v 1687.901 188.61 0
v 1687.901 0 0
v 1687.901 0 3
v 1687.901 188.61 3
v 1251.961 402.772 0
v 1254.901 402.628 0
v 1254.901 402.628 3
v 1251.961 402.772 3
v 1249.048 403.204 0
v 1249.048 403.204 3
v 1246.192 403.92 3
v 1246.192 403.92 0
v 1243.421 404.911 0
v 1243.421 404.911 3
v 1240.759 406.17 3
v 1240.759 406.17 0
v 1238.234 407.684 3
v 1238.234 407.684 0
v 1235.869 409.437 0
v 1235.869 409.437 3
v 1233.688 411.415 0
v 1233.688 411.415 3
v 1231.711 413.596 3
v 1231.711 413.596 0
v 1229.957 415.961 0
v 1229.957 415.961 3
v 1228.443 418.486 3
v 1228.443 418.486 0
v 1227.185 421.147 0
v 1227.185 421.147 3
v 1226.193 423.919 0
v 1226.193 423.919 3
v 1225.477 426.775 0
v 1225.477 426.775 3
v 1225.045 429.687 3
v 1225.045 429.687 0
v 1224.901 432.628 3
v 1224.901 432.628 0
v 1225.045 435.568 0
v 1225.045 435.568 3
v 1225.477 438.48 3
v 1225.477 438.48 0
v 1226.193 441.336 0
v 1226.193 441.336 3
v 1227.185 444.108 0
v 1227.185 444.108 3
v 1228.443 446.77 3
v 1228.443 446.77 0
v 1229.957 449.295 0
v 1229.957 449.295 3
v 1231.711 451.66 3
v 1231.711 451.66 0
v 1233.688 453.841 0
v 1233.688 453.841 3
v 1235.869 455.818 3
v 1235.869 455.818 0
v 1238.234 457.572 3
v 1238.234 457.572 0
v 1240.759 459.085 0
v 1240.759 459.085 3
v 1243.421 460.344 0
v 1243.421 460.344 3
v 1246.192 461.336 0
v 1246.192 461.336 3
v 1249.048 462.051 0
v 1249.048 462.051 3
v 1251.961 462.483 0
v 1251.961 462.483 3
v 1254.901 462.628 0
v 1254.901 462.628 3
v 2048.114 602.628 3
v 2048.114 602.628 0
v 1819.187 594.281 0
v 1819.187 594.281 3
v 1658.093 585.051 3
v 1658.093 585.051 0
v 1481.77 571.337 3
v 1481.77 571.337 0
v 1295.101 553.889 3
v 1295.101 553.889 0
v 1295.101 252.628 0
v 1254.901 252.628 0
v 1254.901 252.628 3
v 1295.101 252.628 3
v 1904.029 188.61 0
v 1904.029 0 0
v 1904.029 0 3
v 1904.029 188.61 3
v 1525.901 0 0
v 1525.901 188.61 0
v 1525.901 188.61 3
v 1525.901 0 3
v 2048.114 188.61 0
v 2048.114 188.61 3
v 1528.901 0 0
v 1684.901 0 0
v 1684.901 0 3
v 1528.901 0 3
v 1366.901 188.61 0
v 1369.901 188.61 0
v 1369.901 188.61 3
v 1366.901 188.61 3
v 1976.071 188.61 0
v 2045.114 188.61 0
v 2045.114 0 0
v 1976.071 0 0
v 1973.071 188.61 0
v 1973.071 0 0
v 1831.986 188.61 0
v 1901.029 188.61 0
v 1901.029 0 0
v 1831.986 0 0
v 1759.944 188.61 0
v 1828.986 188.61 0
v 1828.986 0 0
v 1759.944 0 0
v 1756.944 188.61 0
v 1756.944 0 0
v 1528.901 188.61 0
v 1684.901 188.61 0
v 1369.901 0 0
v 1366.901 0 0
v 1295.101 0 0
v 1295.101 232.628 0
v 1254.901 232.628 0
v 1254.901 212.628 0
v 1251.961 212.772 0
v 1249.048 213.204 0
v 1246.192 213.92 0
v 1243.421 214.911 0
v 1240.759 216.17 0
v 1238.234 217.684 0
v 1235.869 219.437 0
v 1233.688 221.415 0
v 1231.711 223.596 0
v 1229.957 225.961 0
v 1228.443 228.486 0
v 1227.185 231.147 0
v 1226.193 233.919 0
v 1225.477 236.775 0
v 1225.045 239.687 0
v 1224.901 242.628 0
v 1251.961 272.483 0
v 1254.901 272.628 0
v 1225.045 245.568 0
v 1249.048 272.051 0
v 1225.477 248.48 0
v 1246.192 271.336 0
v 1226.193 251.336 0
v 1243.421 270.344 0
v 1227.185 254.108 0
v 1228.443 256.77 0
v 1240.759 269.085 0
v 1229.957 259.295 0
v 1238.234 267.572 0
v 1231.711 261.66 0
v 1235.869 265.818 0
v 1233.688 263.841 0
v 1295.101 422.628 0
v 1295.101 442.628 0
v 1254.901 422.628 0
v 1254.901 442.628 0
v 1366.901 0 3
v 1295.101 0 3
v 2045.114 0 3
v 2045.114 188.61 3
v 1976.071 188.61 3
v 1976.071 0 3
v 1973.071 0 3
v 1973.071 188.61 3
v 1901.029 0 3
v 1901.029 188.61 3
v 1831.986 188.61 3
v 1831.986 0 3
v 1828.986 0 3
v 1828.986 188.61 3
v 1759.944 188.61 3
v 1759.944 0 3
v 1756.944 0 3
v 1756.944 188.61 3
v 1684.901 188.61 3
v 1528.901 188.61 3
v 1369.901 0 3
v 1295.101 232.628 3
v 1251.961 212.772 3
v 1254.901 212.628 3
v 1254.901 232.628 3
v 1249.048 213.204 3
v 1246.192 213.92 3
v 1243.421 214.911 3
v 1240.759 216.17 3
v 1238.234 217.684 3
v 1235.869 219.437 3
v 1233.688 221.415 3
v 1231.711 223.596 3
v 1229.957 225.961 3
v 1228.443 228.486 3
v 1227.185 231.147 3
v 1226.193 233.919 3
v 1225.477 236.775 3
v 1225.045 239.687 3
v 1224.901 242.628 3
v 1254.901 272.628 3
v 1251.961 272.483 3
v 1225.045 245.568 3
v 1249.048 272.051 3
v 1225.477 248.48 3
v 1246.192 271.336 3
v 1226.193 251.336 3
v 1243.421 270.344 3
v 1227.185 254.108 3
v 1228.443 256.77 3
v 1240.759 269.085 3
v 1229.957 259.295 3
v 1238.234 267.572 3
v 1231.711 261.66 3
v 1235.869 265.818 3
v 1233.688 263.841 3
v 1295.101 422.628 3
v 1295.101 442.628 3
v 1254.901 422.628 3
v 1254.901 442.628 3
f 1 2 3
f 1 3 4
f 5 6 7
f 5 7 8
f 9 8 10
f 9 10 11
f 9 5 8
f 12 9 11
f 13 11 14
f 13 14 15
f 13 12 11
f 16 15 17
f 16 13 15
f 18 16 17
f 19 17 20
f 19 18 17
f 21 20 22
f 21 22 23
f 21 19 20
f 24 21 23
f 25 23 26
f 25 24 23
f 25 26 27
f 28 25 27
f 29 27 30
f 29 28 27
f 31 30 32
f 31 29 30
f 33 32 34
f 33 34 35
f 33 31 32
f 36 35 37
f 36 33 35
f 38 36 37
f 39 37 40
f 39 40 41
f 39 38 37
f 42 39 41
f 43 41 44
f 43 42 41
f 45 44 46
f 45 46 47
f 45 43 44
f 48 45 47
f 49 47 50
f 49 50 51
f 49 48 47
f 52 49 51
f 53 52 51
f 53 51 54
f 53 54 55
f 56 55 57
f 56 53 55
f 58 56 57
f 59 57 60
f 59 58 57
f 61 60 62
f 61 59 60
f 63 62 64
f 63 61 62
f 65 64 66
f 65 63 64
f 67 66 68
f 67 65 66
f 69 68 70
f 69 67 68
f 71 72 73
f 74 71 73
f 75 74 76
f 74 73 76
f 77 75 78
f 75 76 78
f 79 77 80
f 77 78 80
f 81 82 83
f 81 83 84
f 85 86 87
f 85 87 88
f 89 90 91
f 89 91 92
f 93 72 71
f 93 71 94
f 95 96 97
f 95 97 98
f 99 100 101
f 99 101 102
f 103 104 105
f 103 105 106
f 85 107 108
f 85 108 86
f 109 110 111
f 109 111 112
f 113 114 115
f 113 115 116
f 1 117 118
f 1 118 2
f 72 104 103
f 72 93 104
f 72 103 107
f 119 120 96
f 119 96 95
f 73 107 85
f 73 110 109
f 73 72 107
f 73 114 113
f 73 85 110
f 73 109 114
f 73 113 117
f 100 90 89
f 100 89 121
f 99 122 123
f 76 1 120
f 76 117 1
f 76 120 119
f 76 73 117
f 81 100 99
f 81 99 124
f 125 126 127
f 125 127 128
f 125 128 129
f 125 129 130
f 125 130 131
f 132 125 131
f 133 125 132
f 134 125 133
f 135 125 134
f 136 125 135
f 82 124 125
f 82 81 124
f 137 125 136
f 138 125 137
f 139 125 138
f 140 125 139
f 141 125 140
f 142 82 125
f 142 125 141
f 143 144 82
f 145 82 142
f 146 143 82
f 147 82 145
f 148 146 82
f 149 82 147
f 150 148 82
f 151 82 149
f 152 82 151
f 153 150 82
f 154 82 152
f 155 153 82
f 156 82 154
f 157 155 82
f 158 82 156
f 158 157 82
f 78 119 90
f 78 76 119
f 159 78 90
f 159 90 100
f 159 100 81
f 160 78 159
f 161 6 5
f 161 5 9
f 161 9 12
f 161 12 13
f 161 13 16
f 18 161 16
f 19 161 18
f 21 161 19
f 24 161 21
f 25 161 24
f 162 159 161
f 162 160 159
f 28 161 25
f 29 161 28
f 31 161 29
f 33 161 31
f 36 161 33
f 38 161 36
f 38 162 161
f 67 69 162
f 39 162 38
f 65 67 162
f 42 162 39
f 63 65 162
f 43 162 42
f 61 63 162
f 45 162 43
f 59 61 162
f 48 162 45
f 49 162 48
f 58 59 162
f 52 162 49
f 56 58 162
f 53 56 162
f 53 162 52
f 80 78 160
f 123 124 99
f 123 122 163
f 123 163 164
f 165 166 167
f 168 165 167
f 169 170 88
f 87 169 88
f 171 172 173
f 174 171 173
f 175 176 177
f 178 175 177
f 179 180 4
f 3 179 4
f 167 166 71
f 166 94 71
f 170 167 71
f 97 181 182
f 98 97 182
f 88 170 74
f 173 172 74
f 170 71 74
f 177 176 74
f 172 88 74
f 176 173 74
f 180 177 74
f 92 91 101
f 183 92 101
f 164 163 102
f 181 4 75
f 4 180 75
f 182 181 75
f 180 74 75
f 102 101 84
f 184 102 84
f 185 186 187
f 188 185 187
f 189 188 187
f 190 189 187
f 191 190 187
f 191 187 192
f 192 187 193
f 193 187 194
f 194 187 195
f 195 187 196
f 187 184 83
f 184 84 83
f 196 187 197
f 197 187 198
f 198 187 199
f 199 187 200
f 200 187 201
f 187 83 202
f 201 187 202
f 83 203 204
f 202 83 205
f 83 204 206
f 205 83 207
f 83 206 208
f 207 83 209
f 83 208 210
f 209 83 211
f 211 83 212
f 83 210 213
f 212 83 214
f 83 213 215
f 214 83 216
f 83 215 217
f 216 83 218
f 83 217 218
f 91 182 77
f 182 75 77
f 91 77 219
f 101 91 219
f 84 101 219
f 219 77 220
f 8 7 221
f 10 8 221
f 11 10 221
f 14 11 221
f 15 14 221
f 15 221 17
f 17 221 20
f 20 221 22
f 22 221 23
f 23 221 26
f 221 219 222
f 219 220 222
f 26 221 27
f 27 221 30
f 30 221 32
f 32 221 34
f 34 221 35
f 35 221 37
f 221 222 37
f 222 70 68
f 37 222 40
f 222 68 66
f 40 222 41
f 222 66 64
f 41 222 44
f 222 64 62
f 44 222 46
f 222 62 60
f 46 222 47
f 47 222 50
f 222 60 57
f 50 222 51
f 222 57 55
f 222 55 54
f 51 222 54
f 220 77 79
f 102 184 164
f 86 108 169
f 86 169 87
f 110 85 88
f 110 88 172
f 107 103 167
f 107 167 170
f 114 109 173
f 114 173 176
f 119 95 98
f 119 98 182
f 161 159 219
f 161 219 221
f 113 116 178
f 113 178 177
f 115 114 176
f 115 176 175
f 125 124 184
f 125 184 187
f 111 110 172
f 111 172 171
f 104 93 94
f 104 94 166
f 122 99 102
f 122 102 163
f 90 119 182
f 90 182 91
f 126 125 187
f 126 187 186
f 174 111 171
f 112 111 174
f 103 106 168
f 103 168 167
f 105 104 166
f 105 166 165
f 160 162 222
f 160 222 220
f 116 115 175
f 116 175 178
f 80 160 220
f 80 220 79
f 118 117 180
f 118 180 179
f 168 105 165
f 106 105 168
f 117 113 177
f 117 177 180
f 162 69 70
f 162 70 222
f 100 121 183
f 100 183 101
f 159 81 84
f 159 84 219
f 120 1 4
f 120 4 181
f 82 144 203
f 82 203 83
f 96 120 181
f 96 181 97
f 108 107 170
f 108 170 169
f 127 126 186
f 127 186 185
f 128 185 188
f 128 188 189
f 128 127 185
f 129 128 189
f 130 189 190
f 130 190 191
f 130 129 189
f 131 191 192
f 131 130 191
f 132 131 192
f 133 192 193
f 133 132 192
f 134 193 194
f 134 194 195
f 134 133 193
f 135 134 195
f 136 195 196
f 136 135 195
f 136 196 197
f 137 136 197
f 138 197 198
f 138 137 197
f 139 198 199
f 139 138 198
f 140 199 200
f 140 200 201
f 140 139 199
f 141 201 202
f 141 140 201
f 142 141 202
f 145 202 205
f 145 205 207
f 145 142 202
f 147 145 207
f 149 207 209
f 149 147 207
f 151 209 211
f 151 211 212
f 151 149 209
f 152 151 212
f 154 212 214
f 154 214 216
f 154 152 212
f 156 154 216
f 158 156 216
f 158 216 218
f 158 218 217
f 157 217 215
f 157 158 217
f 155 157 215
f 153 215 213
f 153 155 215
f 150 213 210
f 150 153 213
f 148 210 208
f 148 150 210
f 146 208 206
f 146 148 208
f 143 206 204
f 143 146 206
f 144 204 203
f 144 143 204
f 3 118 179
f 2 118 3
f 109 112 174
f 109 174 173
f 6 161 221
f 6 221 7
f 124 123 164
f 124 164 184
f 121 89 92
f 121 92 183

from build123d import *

# Parameters (mm, degrees)
BOSS_EXTRUDE1_DEPTH = 3


with BuildPart() as part:
    # Model → Boss-Extrude1 (new body)
    with BuildSketch(Plane.XY):
        with BuildLine():
            Line((1295.101037795, 0), (1295.101037795, 232.627781841))
            Line((1295.101037795, 232.627781841), (1254.901037796, 232.627781841))
            Line((1254.901037796, 232.627781841), (1254.901037796, 212.627781841))
            ThreePointArc((1254.901037796, 212.627781841), (1224.901037796, 242.627781841), (1254.901037796, 272.627781841))
            Line((1254.901037796, 272.627781841), (1254.901037796, 252.627781841))
            Line((1254.901037796, 252.627781841), (1295.101037795, 252.627781841))
            Line((1295.101037795, 252.627781841), (1295.101037795, 422.627781841))
            Line((1295.101037795, 422.627781841), (1254.901037796, 422.627781841))
            Line((1254.901037796, 422.627781841), (1254.901037796, 402.627781841))
            ThreePointArc((1254.901037796, 402.627781841), (1224.901037796, 432.627781841), (1254.901037796, 462.627781841))
            Line((1254.901037796, 462.627781841), (1254.901037796, 442.627781841))
            Line((1254.901037796, 442.627781841), (1295.101037795, 442.627781841))
            Line((1295.101037795, 442.627781841), (1295.101037795, 553.889357901))
            add(Edge.make_bspline(
                [(2048.11356374, 602.627781841), (1934.596406147, 599.111372984), (1718.604938145, 592.182424007), (1441.4869488, 568.541427312), (1295.101037795, 553.889357901)],
                knots=[0.03363534, 0.03363534, 0.03363534, 0.03363534, 0.070138481, 0.108742005, 0.108742005, 0.108742005, 0.108742005], degree=3))
            Line((2048.11356374, 602.627781841), (2048.11356374, 188.610331254))
            Line((2048.11356374, 188.610331254), (2045.113563742, 188.610331254))
            Line((2045.113563742, 188.610331254), (2045.113563742, 0))
            Line((2045.113563742, 0), (1976.071058553, 0))
            Line((1976.071058553, 0), (1976.071058553, 188.610331254))
            Line((1976.071058553, 188.610331254), (1973.071058559, 188.610331254))
            Line((1973.071058559, 188.610331254), (1973.071058559, 0))
            Line((1973.071058559, 0), (1904.028553364, 0))
            Line((1904.028553364, 0), (1904.028553364, 188.610331254))
            Line((1904.028553364, 188.610331254), (1901.028553364, 188.610331254))
            Line((1901.028553364, 188.610331254), (1901.028553364, 0))
            Line((1901.028553364, 0), (1831.986048175, 0))
            Line((1831.986048175, 0), (1831.986048175, 188.610331254))
            Line((1831.986048175, 188.610331254), (1828.986048175, 188.610331254))
            Line((1828.986048175, 188.610331254), (1828.986048175, 0))
            Line((1828.986048175, 0), (1759.943542987, 0))
            Line((1759.943542987, 0), (1759.943542987, 188.610331254))
            Line((1759.943542987, 188.610331254), (1756.943542987, 188.610331254))
            Line((1756.943542987, 188.610331254), (1756.943542987, 0))
            Line((1756.943542987, 0), (1687.901037798, 0))
            Line((1687.901037798, 0), (1687.901037798, 188.610331254))
            Line((1687.901037798, 188.610331254), (1684.901037802, 188.610331254))
            Line((1684.901037802, 188.610331254), (1684.901037802, 0))
            Line((1684.901037802, 0), (1528.901037796, 0))
            Line((1528.901037796, 0), (1528.901037796, 188.610331254))
            Line((1528.901037796, 188.610331254), (1525.901037796, 188.610331254))
            Line((1525.901037796, 188.610331254), (1525.901037796, 0))
            Line((1525.901037796, 0), (1369.901037796, 0))
            Line((1369.901037796, 0), (1369.901037796, 188.610331254))
            Line((1369.901037796, 188.610331254), (1366.901037796, 188.610331254))
            Line((1366.901037796, 188.610331254), (1366.901037796, 0))
            Line((1366.901037796, 0), (1295.101037795, 0))
        make_face()
    extrude(amount=BOSS_EXTRUDE1_DEPTH)


solid = part.part
